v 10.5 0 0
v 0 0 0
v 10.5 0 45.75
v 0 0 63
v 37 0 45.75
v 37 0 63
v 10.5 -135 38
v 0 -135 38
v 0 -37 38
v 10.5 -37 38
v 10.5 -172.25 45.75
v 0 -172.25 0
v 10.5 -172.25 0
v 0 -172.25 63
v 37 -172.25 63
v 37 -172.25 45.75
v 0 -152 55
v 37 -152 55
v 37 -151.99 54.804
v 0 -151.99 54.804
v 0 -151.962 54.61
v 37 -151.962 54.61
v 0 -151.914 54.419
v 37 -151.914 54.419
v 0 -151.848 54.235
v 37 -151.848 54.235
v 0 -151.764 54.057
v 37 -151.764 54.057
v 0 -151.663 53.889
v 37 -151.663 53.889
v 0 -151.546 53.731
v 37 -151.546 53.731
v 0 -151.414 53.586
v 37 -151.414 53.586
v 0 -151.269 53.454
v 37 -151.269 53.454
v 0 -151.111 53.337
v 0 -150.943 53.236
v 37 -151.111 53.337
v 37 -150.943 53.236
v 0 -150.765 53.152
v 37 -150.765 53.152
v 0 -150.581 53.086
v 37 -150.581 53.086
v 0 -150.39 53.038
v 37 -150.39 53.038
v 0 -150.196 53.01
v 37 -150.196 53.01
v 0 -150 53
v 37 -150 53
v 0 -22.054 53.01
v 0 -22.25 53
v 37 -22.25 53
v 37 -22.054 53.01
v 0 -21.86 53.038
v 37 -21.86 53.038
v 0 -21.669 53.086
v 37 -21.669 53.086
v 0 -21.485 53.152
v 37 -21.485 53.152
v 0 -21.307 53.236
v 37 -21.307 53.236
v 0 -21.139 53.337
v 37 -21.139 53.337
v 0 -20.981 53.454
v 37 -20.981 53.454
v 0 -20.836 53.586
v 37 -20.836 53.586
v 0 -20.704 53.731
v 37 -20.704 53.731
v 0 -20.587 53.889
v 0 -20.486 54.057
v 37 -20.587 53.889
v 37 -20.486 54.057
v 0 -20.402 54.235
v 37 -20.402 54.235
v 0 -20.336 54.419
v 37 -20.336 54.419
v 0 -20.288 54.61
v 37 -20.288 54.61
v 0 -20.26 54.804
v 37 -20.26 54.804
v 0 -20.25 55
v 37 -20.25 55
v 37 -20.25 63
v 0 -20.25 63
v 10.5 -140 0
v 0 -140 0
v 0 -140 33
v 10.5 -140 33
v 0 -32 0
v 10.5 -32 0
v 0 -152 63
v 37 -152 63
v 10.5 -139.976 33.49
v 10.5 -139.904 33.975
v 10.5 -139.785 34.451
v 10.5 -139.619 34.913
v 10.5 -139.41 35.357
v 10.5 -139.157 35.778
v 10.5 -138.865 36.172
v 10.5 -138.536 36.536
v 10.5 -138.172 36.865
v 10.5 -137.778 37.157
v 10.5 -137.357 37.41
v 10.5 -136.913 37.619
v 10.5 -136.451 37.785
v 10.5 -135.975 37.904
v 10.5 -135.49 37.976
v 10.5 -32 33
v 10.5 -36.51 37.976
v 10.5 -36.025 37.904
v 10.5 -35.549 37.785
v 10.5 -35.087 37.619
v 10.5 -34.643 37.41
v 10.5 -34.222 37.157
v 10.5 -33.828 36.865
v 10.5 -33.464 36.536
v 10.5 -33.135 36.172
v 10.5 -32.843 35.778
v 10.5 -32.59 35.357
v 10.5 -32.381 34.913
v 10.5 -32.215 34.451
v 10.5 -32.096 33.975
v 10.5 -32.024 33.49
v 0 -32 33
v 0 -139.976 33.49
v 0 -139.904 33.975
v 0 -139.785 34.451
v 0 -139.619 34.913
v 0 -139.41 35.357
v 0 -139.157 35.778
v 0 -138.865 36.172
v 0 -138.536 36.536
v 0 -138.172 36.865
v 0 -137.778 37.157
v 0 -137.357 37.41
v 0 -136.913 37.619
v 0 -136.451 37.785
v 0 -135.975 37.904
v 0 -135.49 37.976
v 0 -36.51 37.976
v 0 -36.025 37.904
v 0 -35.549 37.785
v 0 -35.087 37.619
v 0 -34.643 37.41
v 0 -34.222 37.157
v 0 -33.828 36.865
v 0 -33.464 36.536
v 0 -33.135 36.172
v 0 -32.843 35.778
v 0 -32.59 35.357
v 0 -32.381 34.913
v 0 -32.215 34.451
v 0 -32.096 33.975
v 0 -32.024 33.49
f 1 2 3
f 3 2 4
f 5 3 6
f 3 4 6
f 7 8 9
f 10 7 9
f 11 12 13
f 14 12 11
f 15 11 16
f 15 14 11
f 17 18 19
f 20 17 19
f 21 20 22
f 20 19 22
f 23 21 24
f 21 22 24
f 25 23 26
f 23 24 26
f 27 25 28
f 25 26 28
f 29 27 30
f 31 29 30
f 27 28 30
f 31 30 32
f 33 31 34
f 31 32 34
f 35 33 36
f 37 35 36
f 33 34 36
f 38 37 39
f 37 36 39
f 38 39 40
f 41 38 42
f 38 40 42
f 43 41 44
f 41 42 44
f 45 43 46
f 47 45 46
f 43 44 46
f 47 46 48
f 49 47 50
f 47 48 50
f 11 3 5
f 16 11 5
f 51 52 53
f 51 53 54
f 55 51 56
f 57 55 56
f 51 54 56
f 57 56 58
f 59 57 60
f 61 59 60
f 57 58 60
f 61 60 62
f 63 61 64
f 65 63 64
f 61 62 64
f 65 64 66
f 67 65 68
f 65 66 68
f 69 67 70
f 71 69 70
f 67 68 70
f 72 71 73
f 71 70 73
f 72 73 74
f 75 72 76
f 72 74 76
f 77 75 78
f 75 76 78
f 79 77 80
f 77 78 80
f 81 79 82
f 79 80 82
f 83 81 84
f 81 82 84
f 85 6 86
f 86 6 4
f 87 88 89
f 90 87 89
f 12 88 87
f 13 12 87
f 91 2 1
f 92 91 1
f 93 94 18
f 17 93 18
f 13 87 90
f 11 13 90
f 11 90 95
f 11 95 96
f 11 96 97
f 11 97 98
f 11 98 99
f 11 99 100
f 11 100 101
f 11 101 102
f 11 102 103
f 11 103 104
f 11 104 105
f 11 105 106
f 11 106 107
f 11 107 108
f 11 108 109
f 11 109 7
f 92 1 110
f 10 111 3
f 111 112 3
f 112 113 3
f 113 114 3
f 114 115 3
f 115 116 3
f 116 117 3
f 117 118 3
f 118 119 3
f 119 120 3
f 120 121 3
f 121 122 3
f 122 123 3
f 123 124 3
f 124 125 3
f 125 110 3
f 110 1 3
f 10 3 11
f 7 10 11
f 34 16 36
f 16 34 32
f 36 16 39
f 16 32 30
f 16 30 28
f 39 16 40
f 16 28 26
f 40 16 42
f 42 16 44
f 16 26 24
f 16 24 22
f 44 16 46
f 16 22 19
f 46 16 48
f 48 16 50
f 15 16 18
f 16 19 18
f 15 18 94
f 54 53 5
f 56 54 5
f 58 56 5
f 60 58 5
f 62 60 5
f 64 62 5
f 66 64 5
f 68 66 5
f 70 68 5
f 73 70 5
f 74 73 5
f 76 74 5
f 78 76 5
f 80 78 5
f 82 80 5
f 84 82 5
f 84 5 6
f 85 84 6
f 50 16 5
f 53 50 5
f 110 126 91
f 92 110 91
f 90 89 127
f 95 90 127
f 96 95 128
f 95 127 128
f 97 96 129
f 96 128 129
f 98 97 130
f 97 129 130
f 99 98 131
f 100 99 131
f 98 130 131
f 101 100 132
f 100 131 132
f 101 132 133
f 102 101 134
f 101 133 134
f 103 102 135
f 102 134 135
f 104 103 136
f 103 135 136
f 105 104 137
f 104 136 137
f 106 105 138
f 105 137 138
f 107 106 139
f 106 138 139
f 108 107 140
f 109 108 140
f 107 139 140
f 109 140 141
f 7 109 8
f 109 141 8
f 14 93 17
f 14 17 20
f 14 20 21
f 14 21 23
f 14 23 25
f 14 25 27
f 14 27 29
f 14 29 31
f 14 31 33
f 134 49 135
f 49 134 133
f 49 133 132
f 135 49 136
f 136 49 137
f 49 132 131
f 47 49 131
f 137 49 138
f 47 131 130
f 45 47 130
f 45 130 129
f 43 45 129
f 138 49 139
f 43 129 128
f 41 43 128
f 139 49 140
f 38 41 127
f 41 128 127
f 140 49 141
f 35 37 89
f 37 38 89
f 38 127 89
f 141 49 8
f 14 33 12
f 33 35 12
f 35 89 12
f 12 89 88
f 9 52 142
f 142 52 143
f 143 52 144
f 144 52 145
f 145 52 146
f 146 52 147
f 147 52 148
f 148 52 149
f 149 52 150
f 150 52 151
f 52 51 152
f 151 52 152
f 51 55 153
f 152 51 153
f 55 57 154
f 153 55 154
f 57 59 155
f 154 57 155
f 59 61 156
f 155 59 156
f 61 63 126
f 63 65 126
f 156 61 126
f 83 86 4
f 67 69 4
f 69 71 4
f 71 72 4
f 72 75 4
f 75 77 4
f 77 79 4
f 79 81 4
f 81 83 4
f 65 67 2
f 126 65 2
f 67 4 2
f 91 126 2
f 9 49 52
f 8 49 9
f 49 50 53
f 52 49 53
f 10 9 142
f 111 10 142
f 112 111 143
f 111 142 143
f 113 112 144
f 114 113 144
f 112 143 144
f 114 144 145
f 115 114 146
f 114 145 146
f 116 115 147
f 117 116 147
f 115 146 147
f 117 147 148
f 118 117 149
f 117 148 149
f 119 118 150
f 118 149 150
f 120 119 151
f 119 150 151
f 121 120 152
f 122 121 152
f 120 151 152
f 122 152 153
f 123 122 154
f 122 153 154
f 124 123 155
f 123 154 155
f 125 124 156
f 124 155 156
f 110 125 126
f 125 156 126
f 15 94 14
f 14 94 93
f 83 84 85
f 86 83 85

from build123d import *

# Parameters (mm, degrees)
F1_DEPTH = 172.25
F3_DEPTH = 50
F5_DEPTH = 25


with BuildPart() as f1:
    # F0 (on Front) → F1 (new body)
    with BuildSketch(Plane.XZ):
        Polygon((0, 63), (0, 0), (10.5, 0), (10.5, 45.75), (37, 45.75), (37, 63), align=None)
    extrude(amount=F1_DEPTH)

    # F2 (on face) → F3 (cut)
    with BuildSketch(Plane.YZ.offset(37)):
        with BuildLine():
            Line((-20.25, 63), (-152, 63))
            Line((-152, 63), (-152, 55))
            ThreePointArc((-152, 55), (-151.414214, 53.585786), (-150, 53))
            Line((-150, 53), (-22.25, 53))
            ThreePointArc((-22.25, 53), (-20.835786, 53.585786), (-20.25, 55))
            Line((-20.25, 55), (-20.25, 63))
        make_face()
    extrude(amount=-F3_DEPTH, mode=Mode.SUBTRACT)

    # F4 (on face) → F5 (cut)
    with BuildSketch(Plane(origin=(0, 0, 0), x_dir=(0, -1, 0), z_dir=(-1, 0, 0))):
        with BuildLine():
            Line((32, 33), (32, 0))
            Line((32, 0), (140, 0))
            Line((140, 0), (140, 33))
            ThreePointArc((140, 33), (138.535534, 36.535534), (135, 38))
            Line((135, 38), (37, 38))
            ThreePointArc((37, 38), (33.464466, 36.535534), (32, 33))
        make_face()
    extrude(amount=-F5_DEPTH, mode=Mode.SUBTRACT)


solid = f1.part
